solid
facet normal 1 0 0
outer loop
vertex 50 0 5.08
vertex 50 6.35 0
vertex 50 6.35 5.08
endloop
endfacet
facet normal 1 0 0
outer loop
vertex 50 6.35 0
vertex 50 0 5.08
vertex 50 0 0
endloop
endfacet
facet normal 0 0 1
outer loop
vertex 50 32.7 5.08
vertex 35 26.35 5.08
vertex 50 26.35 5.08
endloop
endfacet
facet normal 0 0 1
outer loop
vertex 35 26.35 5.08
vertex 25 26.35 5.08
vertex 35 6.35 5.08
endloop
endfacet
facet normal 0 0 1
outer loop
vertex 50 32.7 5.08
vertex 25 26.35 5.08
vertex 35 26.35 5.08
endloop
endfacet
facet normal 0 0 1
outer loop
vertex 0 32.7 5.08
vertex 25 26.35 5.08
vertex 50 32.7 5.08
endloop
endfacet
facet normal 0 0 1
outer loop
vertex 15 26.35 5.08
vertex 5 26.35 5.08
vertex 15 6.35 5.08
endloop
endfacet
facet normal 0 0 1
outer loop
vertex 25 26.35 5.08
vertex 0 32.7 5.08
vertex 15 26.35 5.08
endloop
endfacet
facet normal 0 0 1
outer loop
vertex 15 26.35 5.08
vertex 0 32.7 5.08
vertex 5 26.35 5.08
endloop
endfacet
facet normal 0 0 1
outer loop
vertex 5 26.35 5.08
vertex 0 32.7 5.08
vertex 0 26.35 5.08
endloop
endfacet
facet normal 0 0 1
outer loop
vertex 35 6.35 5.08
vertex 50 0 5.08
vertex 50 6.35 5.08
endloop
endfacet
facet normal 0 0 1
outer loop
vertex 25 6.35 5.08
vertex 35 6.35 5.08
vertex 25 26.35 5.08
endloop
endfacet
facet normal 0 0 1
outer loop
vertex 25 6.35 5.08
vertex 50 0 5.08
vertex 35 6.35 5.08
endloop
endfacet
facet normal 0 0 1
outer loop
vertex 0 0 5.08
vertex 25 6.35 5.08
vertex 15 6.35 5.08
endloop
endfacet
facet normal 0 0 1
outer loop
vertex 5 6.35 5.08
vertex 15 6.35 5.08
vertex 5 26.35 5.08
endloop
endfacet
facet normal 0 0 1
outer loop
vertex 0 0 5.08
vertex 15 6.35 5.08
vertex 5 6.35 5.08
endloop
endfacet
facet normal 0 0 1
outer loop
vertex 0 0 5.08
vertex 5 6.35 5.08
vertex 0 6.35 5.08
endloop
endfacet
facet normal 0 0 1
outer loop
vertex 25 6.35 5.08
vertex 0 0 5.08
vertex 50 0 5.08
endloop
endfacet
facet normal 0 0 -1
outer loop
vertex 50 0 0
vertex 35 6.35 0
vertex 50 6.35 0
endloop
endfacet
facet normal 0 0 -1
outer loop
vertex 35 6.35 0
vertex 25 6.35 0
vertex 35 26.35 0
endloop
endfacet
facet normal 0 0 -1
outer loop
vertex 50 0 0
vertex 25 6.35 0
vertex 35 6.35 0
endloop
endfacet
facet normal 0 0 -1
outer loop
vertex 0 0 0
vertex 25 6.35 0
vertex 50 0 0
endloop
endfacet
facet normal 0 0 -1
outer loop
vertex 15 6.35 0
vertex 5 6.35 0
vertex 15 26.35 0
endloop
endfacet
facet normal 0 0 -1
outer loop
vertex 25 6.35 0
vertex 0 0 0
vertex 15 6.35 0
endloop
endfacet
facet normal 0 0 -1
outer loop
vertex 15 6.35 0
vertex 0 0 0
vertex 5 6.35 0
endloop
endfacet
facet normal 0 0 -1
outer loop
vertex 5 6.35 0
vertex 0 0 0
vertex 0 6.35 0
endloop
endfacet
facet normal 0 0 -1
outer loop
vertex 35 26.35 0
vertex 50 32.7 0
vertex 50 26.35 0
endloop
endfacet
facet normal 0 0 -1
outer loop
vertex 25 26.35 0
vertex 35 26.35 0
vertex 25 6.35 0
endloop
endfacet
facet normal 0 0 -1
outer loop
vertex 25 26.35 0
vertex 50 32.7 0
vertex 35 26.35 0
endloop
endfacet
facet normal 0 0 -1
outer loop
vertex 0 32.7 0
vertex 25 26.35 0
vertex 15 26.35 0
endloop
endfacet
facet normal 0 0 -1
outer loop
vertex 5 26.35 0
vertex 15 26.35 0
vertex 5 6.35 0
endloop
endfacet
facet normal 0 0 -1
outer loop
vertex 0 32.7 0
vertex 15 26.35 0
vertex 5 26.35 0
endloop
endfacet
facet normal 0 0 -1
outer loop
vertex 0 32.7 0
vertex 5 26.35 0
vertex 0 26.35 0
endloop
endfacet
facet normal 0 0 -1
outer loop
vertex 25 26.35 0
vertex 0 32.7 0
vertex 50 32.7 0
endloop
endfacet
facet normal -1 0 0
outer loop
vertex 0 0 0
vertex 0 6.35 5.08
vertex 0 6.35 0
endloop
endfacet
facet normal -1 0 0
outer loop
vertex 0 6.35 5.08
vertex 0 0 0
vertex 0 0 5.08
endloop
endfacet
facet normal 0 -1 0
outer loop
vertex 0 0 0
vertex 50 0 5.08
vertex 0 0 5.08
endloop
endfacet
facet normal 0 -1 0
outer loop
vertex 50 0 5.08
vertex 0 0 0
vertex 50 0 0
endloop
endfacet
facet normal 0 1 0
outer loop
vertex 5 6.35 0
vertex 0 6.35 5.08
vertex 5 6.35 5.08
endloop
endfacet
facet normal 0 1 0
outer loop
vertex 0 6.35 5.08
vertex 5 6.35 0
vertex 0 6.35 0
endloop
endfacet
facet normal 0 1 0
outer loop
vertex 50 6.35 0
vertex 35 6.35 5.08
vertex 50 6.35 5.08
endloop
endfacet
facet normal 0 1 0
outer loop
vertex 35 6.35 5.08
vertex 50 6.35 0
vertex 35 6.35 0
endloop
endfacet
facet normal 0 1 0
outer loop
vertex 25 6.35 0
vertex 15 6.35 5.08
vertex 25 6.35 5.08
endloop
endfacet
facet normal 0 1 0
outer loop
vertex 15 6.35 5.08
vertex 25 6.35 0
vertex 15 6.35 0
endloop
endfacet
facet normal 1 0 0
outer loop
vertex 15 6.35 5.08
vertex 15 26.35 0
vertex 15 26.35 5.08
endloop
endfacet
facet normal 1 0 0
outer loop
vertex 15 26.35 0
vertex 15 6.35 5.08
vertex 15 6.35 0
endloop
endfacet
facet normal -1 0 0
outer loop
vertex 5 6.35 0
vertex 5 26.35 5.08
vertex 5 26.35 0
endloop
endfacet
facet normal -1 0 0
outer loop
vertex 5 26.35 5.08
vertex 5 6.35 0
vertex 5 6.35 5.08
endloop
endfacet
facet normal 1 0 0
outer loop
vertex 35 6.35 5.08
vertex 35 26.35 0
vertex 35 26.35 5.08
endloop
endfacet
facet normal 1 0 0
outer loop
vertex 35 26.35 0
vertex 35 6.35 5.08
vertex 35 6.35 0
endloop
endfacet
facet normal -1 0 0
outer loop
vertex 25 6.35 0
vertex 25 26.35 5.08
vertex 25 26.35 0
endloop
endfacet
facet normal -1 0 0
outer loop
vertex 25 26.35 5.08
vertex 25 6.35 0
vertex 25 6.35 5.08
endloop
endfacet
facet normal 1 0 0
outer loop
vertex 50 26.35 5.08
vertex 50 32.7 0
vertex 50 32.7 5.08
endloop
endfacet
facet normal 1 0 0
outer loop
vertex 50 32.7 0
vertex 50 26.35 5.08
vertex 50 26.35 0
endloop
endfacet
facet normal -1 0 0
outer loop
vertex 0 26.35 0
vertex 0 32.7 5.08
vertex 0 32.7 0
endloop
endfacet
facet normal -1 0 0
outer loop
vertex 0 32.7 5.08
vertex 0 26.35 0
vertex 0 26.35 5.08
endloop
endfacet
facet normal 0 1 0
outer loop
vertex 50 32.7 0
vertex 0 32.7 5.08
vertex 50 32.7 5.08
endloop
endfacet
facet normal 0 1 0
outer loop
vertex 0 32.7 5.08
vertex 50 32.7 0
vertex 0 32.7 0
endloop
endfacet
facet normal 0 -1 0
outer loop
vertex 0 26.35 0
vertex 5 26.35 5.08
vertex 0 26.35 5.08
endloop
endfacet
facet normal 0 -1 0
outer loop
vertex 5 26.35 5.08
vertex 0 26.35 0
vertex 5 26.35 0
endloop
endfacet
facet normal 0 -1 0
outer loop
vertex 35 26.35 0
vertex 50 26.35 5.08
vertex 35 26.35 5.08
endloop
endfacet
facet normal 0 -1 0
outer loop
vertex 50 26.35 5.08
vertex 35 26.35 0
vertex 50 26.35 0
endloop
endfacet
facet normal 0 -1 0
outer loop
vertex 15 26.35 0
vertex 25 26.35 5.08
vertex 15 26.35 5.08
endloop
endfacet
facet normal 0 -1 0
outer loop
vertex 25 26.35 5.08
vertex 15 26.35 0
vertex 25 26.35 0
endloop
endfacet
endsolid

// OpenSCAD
// file: model-forge/model-forge/joint.scad
// model-forge/joint.scad — dovetail finger-joint tabs for snap-fit panel
// segmentation. One segment gets protruding tabs (union onto its edge),
// the matching segment gets slightly-larger slots (difference cut into
// its edge) so the two press together with a light interference/snap fit.
//
// Both modules produce a 2D profile running along the X axis, centered
// on the boundary line (y=0), for a boundary of the given edge_length.
// The caller extrudes and positions/rotates it onto the actual seam
// (see back-wall-joint-test.scad for a worked example on a vertical seam).
//
//   use <model-forge/joint.scad>
//   linear_extrude(height=thickness)
//     dovetail_tabs_2d(edge_length=60, tab_width=15, tab_depth=6, taper=2);
//   // on the MATING piece, subtract:
//   linear_extrude(height=thickness+2)
//     dovetail_tabs_2d(edge_length=60, tab_width=15, tab_depth=6, taper=2, clearance=0.15);

module dovetail_tab_2d(tab_width, tab_depth, taper, base_overlap = 0.5) {
  // Trapezoid: narrow at the base, wider at the tip (y=tab_depth) — the
  // taper is what makes it a dovetail (can't pull straight out sideways
  // once the mating slot is filled) and gives the snap/interference feel
  // as it's pressed in along Y. The base extends base_overlap PAST y=0
  // (the seam line) on purpose: a cut/union placed exactly flush with a
  // piece's boundary face (zero overlap) is a classic OpenSCAD/CGAL
  // gotcha — coincident faces produce degenerate, non-manifold results
  // (confirmed here: without the overlap this rendered as a distorted
  // sliver instead of a clean notch). The overlap guarantees real overlap
  // for both the union (tab) and difference (slot) uses.
  polygon(points = [
    [-tab_width / 2, -base_overlap],
    [tab_width / 2, -base_overlap],
    [tab_width / 2 + taper, tab_depth],
    [-tab_width / 2 - taper, tab_depth],
  ]);
}

/**
 * A row of dovetail tabs spanning edge_length, evenly spaced and centered,
 * each tab_width wide with tab_depth of protrusion and the given taper.
 * Pass clearance > 0 (e.g. 0.15-0.2mm) when using this as a SLOT cutout on
 * the mating piece, so the tab has just enough room to press in.
 */
module dovetail_tabs_2d(edge_length, tab_width, tab_depth, taper, clearance = 0) {
  // Growing the slot via offset(delta=clearance) produced a disconnected
  // sliver fragment at the corner (confirmed with --render: 3 volumes
  // instead of 2, a known OpenSCAD quirk with delta-mode offset on a
  // trapezoid). Scaling the tab's own dimensions directly instead avoids
  // offset() entirely and renders as the expected 2 volumes.
  pitch = tab_width * 2;
  n = max(1, floor(edge_length / pitch));
  row_width = n * pitch - tab_width;
  start_x = -row_width / 2;
  for (i = [0 : n - 1]) {
    translate([start_x + i * pitch, 0])
      dovetail_tab_2d(tab_width + 2 * clearance, tab_depth + clearance, taper + clearance);
  }
}
// file: model-forge/rack.scad
// model-forge/rack.scad — oven-rack-style construction: individual bars
// that dovetail into mortise slots on a rail, instead of one molded
// panel. Replaces the "cut a monolithic grate in half" approach: that
// either avoids the bars entirely (leaving only 2 tiny joints holding
// the whole panel together — a weak load path) or requires a shallow
// in-plane tab carved into a thin panel edge (limited by the panel's
// own thin cross-section). A real oven rack is built this way for a
// reason: each bar's FULL cross-section becomes the tenon, engaging the
// rail through its whole thickness — much stronger than a shallow edge
// tab, and the load is distributed across every bar instead of 2 points.
//
// Tenon defaults are the validated small-scale dovetail from
// dovetail-fit-test-small.scad (tab_width=3.5, tab_depth=2.5, taper=0.8)
// at clearance=-0.1mm — the winning value from a real print test
// (-0.15 held but needed a mallet and risked overstressing the joint;
// -0.1 was solid without excessive force).
use <model-forge/joint.scad> // dovetail_tab_2d

DEFAULT_TENON_WIDTH = 3.5;
DEFAULT_TENON_DEPTH = 2.5;
DEFAULT_TENON_TAPER = 0.8;
DEFAULT_CLEARANCE   = -0.1;
// A blind pocket instead of a through-slot: leaves this much solid
// material at the BOTTOM of the mortise (z=0 to floor_thickness) so a
// bar's tenon has a real seat to rest against instead of being able to
// slide all the way through with no positive stop. User: "the middle
// can actually have a small base layer under the rail so that the edge
// rails can hold the dovetail piece without allowing it to fall
// through -- even a 1mm... would work well." Set to 0 for the old
// through-slot behavior.
DEFAULT_FLOOR_THICKNESS = 1;

// A single bar spanning `span`, with a tenon on each end (at y=0,
// pointing further -Y, and at y=span, pointing further +Y). The tenon
// itself is shortened to (thickness - floor_thickness) and lifted to
// start at z=floor_thickness, so its bottom face lands exactly on the
// rail's mortise floor instead of continuing past it.
//
// eps: the bar's own base cube overlaps span by eps on each end so it
// genuinely penetrates into the rail's solid volume, not just touches
// it flush. dovetail_tab_2d's own base_overlap already handles this for
// the tenon itself, but the FLAT part of the bar's end face (the width
// outside the tenon) was still landing exactly coincident with the
// rail's flat face -- confirmed via a non-manifold-edge check (trimesh
// found them at exactly y=rail_width and y=rail_width+span, everywhere
// except the tenon). Same class of bug as tray.scad's lip eps and
// joint.scad's tab base_overlap.
module rack_bar(
  span,
  bar_width,
  thickness,
  tenon_width     = DEFAULT_TENON_WIDTH,
  tenon_depth     = DEFAULT_TENON_DEPTH,
  tenon_taper     = DEFAULT_TENON_TAPER,
  floor_thickness = DEFAULT_FLOOR_THICKNESS
) {
  eps = 0.3;
  tenon_h = thickness - floor_thickness;
  union() {
    translate([0, -eps, 0])
      cube([bar_width, span + 2 * eps, thickness]);
    translate([bar_width / 2, 0, floor_thickness])
      rotate([0, 0, 180])
        linear_extrude(height = tenon_h)
          dovetail_tab_2d(tenon_width, tenon_depth, tenon_taper);
    translate([bar_width / 2, span, floor_thickness])
      linear_extrude(height = tenon_h)
        dovetail_tab_2d(tenon_width, tenon_depth, tenon_taper);
  }
}

// A straight rail with n_bars evenly-spaced mortise slots along its
// y=0 edge, cutting +Y into rail_width. Each slot is a blind pocket
// (see floor_thickness above), not a through-cut. Mirror this piece
// (mirror([0,1,0]) then translate) to use it as the opposite-facing
// rail in an assembly — the slot pattern is symmetric, only the facing
// direction changes.
module rack_rail(
  length,
  rail_width,
  thickness,
  n_bars,
  bar_pitch,
  first_offset,
  tenon_width     = DEFAULT_TENON_WIDTH,
  tenon_depth     = DEFAULT_TENON_DEPTH,
  tenon_taper     = DEFAULT_TENON_TAPER,
  clearance       = DEFAULT_CLEARANCE,
  floor_thickness = DEFAULT_FLOOR_THICKNESS
) {
  difference() {
    cube([length, rail_width, thickness]);
    for (i = [0 : n_bars - 1])
      translate([first_offset + i * bar_pitch, 0, floor_thickness])
        linear_extrude(height = thickness - floor_thickness + 1)
          dovetail_tab_2d(
            tenon_width + 2 * clearance,
            tenon_depth + clearance,
            tenon_taper + clearance
          );
  }
}

// 2D wing profile: flat on the LEFT edge (x=0, where it joins a bar's
// own body), rounded on the RIGHT edge (the outer, x=width side).
// Built as a hull of two near-zero-radius points pinning the flat left
// edge and two real-radius circles rounding the right edge — same
// hull-of-circles technique as tray.scad's rounded_rect_2d.
//
// fillet_r must stay <= width/2, or the fillet circles (centered at
// width-fillet_r) bulge past x=0 and the "flat" edge disappears —
// confirmed: fillet_r=5 on width=6.35 put the circle center only
// 1.35mm from the edge with a 5mm radius, extending to x=-3.65 instead
// of stopping at x=0.
module edge_wing_2d(width, height, fillet_r) {
  hull() {
    translate([0, 0]) circle(r = 0.01, $fn = 8);
    translate([0, height]) circle(r = 0.01, $fn = 8);
    translate([width - fillet_r, fillet_r]) circle(r = fillet_r, $fn = 32);
    translate([width - fillet_r, height - fillet_r]) circle(r = fillet_r, $fn = 32);
  }
}

// An edge bar: identical tenon mechanism to rack_bar (dovetails into
// the SAME rail mortises, at the SAME pitch position as any other bar)
// but wider — extended out to the frame's true outer edge with a
// rounded outer corner, plus the lip flange for docking into the oven
// cavity's support rail. Replaces a separate perpendicular side-rail
// piece entirely: "why are you separating the side ones from the rail
// next to it -- we have 14 normal rails and 2 side rails with a nice
// rounded taper." No new joint type — same dovetail-into-mortise
// mechanism as every other bar, just a wider body on the outer end.
//
// wing_width: how far the wing extends beyond the bar's own bar_width
// (normally = frame_width_mm, reaching exactly to the true frame edge).
// Mirror this module (mirror([1,0,0]) after translating to the bar's
// own local origin) to build the RIGHT-side edge bar from the same code.
module rack_edge_bar(
  span,
  bar_width,
  thickness,
  wing_width,
  fillet_r,
  lip_width       = 0,
  lip_thickness   = 0,
  tenon_width     = DEFAULT_TENON_WIDTH,
  tenon_depth     = DEFAULT_TENON_DEPTH,
  tenon_taper     = DEFAULT_TENON_TAPER,
  floor_thickness = DEFAULT_FLOOR_THICKNESS
) {
  eps = 0.3; // same coincident-face overlap as rack_bar's own base cube
  union() {
    rack_bar(span, bar_width, thickness, tenon_width, tenon_depth, tenon_taper, floor_thickness);
    // Wing overlaps eps into the bar's own core (positive x) instead of
    // stopping exactly flush at x=0 -- same class of bug as the
    // bar/rail coincident face fixed earlier.
    //
    // Bug fixed 2026-09-13: mirroring the 2D profile BEFORE
    // linear_extrude (mirror([1,0]) on edge_wing_2d itself) inverts the
    // polygon winding -- the resulting solid was watertight on its own
    // but with is_winding_consistent=False and NEGATIVE volume. Unioned
    // with the bar's normal-winding solid, this silently produced a
    // mesh missing the wing entirely (confirmed: OpenSCAD's own "mesh
    // is not closed" warning, and the exported STL had no wing
    // geometry at all). Fix: mirror the 3D solid AFTER extrusion
    // instead, which OpenSCAD's dedicated 3D mirror handles correctly.
    translate([eps, 0, 0])
      mirror([1, 0, 0])
        linear_extrude(height = thickness)
          edge_wing_2d(wing_width, span, fillet_r);
    if (lip_width > 0 && lip_thickness > 0)
      translate([-wing_width - lip_width + eps, 0, thickness - lip_thickness])
        cube([lip_width, span, lip_thickness]);
  }
}
// main file
// Tiny Land oven grate v2 — rack-construction proof piece. 2 short bars
// dovetailing into a bottom rail and a top rail, at the validated
// -0.1mm clearance. Small and fast to print, just to prove the
// mechanism (alignment, tenon-into-slot fit, and that the whole thing
// fuses into one connected assembly) before scaling to the real 16-bar,
// full-length grate.
use <model-forge/rack.scad>

rail_length   = 50;
rail_width    = 6.35; // matches the grate's frame_width
thickness     = 5.08; // matches the grate's own thickness
bar_width     = 10;   // matches the grate's own bar_width
span          = 20;   // short test span — the real grate's bars are ~216mm
n_bars        = 2;
bar_pitch     = 20;
first_offset  = 10;

union() {
  // Bottom rail — slots face up (+Y, toward the bars).
  translate([0, rail_width, 0])
    mirror([0, 1, 0])
      rack_rail(rail_length, rail_width, thickness, n_bars, bar_pitch, first_offset);

  // Bars.
  for (i = [0 : n_bars - 1])
    translate([first_offset + i * bar_pitch - bar_width / 2, rail_width, 0])
      rack_bar(span, bar_width, thickness);

  // Top rail — slots face down (-Y, toward the bars), which is
  // rack_rail's natural orientation, no mirror needed.
  translate([0, rail_width + span, 0])
    rack_rail(rail_length, rail_width, thickness, n_bars, bar_pitch, first_offset);
}
